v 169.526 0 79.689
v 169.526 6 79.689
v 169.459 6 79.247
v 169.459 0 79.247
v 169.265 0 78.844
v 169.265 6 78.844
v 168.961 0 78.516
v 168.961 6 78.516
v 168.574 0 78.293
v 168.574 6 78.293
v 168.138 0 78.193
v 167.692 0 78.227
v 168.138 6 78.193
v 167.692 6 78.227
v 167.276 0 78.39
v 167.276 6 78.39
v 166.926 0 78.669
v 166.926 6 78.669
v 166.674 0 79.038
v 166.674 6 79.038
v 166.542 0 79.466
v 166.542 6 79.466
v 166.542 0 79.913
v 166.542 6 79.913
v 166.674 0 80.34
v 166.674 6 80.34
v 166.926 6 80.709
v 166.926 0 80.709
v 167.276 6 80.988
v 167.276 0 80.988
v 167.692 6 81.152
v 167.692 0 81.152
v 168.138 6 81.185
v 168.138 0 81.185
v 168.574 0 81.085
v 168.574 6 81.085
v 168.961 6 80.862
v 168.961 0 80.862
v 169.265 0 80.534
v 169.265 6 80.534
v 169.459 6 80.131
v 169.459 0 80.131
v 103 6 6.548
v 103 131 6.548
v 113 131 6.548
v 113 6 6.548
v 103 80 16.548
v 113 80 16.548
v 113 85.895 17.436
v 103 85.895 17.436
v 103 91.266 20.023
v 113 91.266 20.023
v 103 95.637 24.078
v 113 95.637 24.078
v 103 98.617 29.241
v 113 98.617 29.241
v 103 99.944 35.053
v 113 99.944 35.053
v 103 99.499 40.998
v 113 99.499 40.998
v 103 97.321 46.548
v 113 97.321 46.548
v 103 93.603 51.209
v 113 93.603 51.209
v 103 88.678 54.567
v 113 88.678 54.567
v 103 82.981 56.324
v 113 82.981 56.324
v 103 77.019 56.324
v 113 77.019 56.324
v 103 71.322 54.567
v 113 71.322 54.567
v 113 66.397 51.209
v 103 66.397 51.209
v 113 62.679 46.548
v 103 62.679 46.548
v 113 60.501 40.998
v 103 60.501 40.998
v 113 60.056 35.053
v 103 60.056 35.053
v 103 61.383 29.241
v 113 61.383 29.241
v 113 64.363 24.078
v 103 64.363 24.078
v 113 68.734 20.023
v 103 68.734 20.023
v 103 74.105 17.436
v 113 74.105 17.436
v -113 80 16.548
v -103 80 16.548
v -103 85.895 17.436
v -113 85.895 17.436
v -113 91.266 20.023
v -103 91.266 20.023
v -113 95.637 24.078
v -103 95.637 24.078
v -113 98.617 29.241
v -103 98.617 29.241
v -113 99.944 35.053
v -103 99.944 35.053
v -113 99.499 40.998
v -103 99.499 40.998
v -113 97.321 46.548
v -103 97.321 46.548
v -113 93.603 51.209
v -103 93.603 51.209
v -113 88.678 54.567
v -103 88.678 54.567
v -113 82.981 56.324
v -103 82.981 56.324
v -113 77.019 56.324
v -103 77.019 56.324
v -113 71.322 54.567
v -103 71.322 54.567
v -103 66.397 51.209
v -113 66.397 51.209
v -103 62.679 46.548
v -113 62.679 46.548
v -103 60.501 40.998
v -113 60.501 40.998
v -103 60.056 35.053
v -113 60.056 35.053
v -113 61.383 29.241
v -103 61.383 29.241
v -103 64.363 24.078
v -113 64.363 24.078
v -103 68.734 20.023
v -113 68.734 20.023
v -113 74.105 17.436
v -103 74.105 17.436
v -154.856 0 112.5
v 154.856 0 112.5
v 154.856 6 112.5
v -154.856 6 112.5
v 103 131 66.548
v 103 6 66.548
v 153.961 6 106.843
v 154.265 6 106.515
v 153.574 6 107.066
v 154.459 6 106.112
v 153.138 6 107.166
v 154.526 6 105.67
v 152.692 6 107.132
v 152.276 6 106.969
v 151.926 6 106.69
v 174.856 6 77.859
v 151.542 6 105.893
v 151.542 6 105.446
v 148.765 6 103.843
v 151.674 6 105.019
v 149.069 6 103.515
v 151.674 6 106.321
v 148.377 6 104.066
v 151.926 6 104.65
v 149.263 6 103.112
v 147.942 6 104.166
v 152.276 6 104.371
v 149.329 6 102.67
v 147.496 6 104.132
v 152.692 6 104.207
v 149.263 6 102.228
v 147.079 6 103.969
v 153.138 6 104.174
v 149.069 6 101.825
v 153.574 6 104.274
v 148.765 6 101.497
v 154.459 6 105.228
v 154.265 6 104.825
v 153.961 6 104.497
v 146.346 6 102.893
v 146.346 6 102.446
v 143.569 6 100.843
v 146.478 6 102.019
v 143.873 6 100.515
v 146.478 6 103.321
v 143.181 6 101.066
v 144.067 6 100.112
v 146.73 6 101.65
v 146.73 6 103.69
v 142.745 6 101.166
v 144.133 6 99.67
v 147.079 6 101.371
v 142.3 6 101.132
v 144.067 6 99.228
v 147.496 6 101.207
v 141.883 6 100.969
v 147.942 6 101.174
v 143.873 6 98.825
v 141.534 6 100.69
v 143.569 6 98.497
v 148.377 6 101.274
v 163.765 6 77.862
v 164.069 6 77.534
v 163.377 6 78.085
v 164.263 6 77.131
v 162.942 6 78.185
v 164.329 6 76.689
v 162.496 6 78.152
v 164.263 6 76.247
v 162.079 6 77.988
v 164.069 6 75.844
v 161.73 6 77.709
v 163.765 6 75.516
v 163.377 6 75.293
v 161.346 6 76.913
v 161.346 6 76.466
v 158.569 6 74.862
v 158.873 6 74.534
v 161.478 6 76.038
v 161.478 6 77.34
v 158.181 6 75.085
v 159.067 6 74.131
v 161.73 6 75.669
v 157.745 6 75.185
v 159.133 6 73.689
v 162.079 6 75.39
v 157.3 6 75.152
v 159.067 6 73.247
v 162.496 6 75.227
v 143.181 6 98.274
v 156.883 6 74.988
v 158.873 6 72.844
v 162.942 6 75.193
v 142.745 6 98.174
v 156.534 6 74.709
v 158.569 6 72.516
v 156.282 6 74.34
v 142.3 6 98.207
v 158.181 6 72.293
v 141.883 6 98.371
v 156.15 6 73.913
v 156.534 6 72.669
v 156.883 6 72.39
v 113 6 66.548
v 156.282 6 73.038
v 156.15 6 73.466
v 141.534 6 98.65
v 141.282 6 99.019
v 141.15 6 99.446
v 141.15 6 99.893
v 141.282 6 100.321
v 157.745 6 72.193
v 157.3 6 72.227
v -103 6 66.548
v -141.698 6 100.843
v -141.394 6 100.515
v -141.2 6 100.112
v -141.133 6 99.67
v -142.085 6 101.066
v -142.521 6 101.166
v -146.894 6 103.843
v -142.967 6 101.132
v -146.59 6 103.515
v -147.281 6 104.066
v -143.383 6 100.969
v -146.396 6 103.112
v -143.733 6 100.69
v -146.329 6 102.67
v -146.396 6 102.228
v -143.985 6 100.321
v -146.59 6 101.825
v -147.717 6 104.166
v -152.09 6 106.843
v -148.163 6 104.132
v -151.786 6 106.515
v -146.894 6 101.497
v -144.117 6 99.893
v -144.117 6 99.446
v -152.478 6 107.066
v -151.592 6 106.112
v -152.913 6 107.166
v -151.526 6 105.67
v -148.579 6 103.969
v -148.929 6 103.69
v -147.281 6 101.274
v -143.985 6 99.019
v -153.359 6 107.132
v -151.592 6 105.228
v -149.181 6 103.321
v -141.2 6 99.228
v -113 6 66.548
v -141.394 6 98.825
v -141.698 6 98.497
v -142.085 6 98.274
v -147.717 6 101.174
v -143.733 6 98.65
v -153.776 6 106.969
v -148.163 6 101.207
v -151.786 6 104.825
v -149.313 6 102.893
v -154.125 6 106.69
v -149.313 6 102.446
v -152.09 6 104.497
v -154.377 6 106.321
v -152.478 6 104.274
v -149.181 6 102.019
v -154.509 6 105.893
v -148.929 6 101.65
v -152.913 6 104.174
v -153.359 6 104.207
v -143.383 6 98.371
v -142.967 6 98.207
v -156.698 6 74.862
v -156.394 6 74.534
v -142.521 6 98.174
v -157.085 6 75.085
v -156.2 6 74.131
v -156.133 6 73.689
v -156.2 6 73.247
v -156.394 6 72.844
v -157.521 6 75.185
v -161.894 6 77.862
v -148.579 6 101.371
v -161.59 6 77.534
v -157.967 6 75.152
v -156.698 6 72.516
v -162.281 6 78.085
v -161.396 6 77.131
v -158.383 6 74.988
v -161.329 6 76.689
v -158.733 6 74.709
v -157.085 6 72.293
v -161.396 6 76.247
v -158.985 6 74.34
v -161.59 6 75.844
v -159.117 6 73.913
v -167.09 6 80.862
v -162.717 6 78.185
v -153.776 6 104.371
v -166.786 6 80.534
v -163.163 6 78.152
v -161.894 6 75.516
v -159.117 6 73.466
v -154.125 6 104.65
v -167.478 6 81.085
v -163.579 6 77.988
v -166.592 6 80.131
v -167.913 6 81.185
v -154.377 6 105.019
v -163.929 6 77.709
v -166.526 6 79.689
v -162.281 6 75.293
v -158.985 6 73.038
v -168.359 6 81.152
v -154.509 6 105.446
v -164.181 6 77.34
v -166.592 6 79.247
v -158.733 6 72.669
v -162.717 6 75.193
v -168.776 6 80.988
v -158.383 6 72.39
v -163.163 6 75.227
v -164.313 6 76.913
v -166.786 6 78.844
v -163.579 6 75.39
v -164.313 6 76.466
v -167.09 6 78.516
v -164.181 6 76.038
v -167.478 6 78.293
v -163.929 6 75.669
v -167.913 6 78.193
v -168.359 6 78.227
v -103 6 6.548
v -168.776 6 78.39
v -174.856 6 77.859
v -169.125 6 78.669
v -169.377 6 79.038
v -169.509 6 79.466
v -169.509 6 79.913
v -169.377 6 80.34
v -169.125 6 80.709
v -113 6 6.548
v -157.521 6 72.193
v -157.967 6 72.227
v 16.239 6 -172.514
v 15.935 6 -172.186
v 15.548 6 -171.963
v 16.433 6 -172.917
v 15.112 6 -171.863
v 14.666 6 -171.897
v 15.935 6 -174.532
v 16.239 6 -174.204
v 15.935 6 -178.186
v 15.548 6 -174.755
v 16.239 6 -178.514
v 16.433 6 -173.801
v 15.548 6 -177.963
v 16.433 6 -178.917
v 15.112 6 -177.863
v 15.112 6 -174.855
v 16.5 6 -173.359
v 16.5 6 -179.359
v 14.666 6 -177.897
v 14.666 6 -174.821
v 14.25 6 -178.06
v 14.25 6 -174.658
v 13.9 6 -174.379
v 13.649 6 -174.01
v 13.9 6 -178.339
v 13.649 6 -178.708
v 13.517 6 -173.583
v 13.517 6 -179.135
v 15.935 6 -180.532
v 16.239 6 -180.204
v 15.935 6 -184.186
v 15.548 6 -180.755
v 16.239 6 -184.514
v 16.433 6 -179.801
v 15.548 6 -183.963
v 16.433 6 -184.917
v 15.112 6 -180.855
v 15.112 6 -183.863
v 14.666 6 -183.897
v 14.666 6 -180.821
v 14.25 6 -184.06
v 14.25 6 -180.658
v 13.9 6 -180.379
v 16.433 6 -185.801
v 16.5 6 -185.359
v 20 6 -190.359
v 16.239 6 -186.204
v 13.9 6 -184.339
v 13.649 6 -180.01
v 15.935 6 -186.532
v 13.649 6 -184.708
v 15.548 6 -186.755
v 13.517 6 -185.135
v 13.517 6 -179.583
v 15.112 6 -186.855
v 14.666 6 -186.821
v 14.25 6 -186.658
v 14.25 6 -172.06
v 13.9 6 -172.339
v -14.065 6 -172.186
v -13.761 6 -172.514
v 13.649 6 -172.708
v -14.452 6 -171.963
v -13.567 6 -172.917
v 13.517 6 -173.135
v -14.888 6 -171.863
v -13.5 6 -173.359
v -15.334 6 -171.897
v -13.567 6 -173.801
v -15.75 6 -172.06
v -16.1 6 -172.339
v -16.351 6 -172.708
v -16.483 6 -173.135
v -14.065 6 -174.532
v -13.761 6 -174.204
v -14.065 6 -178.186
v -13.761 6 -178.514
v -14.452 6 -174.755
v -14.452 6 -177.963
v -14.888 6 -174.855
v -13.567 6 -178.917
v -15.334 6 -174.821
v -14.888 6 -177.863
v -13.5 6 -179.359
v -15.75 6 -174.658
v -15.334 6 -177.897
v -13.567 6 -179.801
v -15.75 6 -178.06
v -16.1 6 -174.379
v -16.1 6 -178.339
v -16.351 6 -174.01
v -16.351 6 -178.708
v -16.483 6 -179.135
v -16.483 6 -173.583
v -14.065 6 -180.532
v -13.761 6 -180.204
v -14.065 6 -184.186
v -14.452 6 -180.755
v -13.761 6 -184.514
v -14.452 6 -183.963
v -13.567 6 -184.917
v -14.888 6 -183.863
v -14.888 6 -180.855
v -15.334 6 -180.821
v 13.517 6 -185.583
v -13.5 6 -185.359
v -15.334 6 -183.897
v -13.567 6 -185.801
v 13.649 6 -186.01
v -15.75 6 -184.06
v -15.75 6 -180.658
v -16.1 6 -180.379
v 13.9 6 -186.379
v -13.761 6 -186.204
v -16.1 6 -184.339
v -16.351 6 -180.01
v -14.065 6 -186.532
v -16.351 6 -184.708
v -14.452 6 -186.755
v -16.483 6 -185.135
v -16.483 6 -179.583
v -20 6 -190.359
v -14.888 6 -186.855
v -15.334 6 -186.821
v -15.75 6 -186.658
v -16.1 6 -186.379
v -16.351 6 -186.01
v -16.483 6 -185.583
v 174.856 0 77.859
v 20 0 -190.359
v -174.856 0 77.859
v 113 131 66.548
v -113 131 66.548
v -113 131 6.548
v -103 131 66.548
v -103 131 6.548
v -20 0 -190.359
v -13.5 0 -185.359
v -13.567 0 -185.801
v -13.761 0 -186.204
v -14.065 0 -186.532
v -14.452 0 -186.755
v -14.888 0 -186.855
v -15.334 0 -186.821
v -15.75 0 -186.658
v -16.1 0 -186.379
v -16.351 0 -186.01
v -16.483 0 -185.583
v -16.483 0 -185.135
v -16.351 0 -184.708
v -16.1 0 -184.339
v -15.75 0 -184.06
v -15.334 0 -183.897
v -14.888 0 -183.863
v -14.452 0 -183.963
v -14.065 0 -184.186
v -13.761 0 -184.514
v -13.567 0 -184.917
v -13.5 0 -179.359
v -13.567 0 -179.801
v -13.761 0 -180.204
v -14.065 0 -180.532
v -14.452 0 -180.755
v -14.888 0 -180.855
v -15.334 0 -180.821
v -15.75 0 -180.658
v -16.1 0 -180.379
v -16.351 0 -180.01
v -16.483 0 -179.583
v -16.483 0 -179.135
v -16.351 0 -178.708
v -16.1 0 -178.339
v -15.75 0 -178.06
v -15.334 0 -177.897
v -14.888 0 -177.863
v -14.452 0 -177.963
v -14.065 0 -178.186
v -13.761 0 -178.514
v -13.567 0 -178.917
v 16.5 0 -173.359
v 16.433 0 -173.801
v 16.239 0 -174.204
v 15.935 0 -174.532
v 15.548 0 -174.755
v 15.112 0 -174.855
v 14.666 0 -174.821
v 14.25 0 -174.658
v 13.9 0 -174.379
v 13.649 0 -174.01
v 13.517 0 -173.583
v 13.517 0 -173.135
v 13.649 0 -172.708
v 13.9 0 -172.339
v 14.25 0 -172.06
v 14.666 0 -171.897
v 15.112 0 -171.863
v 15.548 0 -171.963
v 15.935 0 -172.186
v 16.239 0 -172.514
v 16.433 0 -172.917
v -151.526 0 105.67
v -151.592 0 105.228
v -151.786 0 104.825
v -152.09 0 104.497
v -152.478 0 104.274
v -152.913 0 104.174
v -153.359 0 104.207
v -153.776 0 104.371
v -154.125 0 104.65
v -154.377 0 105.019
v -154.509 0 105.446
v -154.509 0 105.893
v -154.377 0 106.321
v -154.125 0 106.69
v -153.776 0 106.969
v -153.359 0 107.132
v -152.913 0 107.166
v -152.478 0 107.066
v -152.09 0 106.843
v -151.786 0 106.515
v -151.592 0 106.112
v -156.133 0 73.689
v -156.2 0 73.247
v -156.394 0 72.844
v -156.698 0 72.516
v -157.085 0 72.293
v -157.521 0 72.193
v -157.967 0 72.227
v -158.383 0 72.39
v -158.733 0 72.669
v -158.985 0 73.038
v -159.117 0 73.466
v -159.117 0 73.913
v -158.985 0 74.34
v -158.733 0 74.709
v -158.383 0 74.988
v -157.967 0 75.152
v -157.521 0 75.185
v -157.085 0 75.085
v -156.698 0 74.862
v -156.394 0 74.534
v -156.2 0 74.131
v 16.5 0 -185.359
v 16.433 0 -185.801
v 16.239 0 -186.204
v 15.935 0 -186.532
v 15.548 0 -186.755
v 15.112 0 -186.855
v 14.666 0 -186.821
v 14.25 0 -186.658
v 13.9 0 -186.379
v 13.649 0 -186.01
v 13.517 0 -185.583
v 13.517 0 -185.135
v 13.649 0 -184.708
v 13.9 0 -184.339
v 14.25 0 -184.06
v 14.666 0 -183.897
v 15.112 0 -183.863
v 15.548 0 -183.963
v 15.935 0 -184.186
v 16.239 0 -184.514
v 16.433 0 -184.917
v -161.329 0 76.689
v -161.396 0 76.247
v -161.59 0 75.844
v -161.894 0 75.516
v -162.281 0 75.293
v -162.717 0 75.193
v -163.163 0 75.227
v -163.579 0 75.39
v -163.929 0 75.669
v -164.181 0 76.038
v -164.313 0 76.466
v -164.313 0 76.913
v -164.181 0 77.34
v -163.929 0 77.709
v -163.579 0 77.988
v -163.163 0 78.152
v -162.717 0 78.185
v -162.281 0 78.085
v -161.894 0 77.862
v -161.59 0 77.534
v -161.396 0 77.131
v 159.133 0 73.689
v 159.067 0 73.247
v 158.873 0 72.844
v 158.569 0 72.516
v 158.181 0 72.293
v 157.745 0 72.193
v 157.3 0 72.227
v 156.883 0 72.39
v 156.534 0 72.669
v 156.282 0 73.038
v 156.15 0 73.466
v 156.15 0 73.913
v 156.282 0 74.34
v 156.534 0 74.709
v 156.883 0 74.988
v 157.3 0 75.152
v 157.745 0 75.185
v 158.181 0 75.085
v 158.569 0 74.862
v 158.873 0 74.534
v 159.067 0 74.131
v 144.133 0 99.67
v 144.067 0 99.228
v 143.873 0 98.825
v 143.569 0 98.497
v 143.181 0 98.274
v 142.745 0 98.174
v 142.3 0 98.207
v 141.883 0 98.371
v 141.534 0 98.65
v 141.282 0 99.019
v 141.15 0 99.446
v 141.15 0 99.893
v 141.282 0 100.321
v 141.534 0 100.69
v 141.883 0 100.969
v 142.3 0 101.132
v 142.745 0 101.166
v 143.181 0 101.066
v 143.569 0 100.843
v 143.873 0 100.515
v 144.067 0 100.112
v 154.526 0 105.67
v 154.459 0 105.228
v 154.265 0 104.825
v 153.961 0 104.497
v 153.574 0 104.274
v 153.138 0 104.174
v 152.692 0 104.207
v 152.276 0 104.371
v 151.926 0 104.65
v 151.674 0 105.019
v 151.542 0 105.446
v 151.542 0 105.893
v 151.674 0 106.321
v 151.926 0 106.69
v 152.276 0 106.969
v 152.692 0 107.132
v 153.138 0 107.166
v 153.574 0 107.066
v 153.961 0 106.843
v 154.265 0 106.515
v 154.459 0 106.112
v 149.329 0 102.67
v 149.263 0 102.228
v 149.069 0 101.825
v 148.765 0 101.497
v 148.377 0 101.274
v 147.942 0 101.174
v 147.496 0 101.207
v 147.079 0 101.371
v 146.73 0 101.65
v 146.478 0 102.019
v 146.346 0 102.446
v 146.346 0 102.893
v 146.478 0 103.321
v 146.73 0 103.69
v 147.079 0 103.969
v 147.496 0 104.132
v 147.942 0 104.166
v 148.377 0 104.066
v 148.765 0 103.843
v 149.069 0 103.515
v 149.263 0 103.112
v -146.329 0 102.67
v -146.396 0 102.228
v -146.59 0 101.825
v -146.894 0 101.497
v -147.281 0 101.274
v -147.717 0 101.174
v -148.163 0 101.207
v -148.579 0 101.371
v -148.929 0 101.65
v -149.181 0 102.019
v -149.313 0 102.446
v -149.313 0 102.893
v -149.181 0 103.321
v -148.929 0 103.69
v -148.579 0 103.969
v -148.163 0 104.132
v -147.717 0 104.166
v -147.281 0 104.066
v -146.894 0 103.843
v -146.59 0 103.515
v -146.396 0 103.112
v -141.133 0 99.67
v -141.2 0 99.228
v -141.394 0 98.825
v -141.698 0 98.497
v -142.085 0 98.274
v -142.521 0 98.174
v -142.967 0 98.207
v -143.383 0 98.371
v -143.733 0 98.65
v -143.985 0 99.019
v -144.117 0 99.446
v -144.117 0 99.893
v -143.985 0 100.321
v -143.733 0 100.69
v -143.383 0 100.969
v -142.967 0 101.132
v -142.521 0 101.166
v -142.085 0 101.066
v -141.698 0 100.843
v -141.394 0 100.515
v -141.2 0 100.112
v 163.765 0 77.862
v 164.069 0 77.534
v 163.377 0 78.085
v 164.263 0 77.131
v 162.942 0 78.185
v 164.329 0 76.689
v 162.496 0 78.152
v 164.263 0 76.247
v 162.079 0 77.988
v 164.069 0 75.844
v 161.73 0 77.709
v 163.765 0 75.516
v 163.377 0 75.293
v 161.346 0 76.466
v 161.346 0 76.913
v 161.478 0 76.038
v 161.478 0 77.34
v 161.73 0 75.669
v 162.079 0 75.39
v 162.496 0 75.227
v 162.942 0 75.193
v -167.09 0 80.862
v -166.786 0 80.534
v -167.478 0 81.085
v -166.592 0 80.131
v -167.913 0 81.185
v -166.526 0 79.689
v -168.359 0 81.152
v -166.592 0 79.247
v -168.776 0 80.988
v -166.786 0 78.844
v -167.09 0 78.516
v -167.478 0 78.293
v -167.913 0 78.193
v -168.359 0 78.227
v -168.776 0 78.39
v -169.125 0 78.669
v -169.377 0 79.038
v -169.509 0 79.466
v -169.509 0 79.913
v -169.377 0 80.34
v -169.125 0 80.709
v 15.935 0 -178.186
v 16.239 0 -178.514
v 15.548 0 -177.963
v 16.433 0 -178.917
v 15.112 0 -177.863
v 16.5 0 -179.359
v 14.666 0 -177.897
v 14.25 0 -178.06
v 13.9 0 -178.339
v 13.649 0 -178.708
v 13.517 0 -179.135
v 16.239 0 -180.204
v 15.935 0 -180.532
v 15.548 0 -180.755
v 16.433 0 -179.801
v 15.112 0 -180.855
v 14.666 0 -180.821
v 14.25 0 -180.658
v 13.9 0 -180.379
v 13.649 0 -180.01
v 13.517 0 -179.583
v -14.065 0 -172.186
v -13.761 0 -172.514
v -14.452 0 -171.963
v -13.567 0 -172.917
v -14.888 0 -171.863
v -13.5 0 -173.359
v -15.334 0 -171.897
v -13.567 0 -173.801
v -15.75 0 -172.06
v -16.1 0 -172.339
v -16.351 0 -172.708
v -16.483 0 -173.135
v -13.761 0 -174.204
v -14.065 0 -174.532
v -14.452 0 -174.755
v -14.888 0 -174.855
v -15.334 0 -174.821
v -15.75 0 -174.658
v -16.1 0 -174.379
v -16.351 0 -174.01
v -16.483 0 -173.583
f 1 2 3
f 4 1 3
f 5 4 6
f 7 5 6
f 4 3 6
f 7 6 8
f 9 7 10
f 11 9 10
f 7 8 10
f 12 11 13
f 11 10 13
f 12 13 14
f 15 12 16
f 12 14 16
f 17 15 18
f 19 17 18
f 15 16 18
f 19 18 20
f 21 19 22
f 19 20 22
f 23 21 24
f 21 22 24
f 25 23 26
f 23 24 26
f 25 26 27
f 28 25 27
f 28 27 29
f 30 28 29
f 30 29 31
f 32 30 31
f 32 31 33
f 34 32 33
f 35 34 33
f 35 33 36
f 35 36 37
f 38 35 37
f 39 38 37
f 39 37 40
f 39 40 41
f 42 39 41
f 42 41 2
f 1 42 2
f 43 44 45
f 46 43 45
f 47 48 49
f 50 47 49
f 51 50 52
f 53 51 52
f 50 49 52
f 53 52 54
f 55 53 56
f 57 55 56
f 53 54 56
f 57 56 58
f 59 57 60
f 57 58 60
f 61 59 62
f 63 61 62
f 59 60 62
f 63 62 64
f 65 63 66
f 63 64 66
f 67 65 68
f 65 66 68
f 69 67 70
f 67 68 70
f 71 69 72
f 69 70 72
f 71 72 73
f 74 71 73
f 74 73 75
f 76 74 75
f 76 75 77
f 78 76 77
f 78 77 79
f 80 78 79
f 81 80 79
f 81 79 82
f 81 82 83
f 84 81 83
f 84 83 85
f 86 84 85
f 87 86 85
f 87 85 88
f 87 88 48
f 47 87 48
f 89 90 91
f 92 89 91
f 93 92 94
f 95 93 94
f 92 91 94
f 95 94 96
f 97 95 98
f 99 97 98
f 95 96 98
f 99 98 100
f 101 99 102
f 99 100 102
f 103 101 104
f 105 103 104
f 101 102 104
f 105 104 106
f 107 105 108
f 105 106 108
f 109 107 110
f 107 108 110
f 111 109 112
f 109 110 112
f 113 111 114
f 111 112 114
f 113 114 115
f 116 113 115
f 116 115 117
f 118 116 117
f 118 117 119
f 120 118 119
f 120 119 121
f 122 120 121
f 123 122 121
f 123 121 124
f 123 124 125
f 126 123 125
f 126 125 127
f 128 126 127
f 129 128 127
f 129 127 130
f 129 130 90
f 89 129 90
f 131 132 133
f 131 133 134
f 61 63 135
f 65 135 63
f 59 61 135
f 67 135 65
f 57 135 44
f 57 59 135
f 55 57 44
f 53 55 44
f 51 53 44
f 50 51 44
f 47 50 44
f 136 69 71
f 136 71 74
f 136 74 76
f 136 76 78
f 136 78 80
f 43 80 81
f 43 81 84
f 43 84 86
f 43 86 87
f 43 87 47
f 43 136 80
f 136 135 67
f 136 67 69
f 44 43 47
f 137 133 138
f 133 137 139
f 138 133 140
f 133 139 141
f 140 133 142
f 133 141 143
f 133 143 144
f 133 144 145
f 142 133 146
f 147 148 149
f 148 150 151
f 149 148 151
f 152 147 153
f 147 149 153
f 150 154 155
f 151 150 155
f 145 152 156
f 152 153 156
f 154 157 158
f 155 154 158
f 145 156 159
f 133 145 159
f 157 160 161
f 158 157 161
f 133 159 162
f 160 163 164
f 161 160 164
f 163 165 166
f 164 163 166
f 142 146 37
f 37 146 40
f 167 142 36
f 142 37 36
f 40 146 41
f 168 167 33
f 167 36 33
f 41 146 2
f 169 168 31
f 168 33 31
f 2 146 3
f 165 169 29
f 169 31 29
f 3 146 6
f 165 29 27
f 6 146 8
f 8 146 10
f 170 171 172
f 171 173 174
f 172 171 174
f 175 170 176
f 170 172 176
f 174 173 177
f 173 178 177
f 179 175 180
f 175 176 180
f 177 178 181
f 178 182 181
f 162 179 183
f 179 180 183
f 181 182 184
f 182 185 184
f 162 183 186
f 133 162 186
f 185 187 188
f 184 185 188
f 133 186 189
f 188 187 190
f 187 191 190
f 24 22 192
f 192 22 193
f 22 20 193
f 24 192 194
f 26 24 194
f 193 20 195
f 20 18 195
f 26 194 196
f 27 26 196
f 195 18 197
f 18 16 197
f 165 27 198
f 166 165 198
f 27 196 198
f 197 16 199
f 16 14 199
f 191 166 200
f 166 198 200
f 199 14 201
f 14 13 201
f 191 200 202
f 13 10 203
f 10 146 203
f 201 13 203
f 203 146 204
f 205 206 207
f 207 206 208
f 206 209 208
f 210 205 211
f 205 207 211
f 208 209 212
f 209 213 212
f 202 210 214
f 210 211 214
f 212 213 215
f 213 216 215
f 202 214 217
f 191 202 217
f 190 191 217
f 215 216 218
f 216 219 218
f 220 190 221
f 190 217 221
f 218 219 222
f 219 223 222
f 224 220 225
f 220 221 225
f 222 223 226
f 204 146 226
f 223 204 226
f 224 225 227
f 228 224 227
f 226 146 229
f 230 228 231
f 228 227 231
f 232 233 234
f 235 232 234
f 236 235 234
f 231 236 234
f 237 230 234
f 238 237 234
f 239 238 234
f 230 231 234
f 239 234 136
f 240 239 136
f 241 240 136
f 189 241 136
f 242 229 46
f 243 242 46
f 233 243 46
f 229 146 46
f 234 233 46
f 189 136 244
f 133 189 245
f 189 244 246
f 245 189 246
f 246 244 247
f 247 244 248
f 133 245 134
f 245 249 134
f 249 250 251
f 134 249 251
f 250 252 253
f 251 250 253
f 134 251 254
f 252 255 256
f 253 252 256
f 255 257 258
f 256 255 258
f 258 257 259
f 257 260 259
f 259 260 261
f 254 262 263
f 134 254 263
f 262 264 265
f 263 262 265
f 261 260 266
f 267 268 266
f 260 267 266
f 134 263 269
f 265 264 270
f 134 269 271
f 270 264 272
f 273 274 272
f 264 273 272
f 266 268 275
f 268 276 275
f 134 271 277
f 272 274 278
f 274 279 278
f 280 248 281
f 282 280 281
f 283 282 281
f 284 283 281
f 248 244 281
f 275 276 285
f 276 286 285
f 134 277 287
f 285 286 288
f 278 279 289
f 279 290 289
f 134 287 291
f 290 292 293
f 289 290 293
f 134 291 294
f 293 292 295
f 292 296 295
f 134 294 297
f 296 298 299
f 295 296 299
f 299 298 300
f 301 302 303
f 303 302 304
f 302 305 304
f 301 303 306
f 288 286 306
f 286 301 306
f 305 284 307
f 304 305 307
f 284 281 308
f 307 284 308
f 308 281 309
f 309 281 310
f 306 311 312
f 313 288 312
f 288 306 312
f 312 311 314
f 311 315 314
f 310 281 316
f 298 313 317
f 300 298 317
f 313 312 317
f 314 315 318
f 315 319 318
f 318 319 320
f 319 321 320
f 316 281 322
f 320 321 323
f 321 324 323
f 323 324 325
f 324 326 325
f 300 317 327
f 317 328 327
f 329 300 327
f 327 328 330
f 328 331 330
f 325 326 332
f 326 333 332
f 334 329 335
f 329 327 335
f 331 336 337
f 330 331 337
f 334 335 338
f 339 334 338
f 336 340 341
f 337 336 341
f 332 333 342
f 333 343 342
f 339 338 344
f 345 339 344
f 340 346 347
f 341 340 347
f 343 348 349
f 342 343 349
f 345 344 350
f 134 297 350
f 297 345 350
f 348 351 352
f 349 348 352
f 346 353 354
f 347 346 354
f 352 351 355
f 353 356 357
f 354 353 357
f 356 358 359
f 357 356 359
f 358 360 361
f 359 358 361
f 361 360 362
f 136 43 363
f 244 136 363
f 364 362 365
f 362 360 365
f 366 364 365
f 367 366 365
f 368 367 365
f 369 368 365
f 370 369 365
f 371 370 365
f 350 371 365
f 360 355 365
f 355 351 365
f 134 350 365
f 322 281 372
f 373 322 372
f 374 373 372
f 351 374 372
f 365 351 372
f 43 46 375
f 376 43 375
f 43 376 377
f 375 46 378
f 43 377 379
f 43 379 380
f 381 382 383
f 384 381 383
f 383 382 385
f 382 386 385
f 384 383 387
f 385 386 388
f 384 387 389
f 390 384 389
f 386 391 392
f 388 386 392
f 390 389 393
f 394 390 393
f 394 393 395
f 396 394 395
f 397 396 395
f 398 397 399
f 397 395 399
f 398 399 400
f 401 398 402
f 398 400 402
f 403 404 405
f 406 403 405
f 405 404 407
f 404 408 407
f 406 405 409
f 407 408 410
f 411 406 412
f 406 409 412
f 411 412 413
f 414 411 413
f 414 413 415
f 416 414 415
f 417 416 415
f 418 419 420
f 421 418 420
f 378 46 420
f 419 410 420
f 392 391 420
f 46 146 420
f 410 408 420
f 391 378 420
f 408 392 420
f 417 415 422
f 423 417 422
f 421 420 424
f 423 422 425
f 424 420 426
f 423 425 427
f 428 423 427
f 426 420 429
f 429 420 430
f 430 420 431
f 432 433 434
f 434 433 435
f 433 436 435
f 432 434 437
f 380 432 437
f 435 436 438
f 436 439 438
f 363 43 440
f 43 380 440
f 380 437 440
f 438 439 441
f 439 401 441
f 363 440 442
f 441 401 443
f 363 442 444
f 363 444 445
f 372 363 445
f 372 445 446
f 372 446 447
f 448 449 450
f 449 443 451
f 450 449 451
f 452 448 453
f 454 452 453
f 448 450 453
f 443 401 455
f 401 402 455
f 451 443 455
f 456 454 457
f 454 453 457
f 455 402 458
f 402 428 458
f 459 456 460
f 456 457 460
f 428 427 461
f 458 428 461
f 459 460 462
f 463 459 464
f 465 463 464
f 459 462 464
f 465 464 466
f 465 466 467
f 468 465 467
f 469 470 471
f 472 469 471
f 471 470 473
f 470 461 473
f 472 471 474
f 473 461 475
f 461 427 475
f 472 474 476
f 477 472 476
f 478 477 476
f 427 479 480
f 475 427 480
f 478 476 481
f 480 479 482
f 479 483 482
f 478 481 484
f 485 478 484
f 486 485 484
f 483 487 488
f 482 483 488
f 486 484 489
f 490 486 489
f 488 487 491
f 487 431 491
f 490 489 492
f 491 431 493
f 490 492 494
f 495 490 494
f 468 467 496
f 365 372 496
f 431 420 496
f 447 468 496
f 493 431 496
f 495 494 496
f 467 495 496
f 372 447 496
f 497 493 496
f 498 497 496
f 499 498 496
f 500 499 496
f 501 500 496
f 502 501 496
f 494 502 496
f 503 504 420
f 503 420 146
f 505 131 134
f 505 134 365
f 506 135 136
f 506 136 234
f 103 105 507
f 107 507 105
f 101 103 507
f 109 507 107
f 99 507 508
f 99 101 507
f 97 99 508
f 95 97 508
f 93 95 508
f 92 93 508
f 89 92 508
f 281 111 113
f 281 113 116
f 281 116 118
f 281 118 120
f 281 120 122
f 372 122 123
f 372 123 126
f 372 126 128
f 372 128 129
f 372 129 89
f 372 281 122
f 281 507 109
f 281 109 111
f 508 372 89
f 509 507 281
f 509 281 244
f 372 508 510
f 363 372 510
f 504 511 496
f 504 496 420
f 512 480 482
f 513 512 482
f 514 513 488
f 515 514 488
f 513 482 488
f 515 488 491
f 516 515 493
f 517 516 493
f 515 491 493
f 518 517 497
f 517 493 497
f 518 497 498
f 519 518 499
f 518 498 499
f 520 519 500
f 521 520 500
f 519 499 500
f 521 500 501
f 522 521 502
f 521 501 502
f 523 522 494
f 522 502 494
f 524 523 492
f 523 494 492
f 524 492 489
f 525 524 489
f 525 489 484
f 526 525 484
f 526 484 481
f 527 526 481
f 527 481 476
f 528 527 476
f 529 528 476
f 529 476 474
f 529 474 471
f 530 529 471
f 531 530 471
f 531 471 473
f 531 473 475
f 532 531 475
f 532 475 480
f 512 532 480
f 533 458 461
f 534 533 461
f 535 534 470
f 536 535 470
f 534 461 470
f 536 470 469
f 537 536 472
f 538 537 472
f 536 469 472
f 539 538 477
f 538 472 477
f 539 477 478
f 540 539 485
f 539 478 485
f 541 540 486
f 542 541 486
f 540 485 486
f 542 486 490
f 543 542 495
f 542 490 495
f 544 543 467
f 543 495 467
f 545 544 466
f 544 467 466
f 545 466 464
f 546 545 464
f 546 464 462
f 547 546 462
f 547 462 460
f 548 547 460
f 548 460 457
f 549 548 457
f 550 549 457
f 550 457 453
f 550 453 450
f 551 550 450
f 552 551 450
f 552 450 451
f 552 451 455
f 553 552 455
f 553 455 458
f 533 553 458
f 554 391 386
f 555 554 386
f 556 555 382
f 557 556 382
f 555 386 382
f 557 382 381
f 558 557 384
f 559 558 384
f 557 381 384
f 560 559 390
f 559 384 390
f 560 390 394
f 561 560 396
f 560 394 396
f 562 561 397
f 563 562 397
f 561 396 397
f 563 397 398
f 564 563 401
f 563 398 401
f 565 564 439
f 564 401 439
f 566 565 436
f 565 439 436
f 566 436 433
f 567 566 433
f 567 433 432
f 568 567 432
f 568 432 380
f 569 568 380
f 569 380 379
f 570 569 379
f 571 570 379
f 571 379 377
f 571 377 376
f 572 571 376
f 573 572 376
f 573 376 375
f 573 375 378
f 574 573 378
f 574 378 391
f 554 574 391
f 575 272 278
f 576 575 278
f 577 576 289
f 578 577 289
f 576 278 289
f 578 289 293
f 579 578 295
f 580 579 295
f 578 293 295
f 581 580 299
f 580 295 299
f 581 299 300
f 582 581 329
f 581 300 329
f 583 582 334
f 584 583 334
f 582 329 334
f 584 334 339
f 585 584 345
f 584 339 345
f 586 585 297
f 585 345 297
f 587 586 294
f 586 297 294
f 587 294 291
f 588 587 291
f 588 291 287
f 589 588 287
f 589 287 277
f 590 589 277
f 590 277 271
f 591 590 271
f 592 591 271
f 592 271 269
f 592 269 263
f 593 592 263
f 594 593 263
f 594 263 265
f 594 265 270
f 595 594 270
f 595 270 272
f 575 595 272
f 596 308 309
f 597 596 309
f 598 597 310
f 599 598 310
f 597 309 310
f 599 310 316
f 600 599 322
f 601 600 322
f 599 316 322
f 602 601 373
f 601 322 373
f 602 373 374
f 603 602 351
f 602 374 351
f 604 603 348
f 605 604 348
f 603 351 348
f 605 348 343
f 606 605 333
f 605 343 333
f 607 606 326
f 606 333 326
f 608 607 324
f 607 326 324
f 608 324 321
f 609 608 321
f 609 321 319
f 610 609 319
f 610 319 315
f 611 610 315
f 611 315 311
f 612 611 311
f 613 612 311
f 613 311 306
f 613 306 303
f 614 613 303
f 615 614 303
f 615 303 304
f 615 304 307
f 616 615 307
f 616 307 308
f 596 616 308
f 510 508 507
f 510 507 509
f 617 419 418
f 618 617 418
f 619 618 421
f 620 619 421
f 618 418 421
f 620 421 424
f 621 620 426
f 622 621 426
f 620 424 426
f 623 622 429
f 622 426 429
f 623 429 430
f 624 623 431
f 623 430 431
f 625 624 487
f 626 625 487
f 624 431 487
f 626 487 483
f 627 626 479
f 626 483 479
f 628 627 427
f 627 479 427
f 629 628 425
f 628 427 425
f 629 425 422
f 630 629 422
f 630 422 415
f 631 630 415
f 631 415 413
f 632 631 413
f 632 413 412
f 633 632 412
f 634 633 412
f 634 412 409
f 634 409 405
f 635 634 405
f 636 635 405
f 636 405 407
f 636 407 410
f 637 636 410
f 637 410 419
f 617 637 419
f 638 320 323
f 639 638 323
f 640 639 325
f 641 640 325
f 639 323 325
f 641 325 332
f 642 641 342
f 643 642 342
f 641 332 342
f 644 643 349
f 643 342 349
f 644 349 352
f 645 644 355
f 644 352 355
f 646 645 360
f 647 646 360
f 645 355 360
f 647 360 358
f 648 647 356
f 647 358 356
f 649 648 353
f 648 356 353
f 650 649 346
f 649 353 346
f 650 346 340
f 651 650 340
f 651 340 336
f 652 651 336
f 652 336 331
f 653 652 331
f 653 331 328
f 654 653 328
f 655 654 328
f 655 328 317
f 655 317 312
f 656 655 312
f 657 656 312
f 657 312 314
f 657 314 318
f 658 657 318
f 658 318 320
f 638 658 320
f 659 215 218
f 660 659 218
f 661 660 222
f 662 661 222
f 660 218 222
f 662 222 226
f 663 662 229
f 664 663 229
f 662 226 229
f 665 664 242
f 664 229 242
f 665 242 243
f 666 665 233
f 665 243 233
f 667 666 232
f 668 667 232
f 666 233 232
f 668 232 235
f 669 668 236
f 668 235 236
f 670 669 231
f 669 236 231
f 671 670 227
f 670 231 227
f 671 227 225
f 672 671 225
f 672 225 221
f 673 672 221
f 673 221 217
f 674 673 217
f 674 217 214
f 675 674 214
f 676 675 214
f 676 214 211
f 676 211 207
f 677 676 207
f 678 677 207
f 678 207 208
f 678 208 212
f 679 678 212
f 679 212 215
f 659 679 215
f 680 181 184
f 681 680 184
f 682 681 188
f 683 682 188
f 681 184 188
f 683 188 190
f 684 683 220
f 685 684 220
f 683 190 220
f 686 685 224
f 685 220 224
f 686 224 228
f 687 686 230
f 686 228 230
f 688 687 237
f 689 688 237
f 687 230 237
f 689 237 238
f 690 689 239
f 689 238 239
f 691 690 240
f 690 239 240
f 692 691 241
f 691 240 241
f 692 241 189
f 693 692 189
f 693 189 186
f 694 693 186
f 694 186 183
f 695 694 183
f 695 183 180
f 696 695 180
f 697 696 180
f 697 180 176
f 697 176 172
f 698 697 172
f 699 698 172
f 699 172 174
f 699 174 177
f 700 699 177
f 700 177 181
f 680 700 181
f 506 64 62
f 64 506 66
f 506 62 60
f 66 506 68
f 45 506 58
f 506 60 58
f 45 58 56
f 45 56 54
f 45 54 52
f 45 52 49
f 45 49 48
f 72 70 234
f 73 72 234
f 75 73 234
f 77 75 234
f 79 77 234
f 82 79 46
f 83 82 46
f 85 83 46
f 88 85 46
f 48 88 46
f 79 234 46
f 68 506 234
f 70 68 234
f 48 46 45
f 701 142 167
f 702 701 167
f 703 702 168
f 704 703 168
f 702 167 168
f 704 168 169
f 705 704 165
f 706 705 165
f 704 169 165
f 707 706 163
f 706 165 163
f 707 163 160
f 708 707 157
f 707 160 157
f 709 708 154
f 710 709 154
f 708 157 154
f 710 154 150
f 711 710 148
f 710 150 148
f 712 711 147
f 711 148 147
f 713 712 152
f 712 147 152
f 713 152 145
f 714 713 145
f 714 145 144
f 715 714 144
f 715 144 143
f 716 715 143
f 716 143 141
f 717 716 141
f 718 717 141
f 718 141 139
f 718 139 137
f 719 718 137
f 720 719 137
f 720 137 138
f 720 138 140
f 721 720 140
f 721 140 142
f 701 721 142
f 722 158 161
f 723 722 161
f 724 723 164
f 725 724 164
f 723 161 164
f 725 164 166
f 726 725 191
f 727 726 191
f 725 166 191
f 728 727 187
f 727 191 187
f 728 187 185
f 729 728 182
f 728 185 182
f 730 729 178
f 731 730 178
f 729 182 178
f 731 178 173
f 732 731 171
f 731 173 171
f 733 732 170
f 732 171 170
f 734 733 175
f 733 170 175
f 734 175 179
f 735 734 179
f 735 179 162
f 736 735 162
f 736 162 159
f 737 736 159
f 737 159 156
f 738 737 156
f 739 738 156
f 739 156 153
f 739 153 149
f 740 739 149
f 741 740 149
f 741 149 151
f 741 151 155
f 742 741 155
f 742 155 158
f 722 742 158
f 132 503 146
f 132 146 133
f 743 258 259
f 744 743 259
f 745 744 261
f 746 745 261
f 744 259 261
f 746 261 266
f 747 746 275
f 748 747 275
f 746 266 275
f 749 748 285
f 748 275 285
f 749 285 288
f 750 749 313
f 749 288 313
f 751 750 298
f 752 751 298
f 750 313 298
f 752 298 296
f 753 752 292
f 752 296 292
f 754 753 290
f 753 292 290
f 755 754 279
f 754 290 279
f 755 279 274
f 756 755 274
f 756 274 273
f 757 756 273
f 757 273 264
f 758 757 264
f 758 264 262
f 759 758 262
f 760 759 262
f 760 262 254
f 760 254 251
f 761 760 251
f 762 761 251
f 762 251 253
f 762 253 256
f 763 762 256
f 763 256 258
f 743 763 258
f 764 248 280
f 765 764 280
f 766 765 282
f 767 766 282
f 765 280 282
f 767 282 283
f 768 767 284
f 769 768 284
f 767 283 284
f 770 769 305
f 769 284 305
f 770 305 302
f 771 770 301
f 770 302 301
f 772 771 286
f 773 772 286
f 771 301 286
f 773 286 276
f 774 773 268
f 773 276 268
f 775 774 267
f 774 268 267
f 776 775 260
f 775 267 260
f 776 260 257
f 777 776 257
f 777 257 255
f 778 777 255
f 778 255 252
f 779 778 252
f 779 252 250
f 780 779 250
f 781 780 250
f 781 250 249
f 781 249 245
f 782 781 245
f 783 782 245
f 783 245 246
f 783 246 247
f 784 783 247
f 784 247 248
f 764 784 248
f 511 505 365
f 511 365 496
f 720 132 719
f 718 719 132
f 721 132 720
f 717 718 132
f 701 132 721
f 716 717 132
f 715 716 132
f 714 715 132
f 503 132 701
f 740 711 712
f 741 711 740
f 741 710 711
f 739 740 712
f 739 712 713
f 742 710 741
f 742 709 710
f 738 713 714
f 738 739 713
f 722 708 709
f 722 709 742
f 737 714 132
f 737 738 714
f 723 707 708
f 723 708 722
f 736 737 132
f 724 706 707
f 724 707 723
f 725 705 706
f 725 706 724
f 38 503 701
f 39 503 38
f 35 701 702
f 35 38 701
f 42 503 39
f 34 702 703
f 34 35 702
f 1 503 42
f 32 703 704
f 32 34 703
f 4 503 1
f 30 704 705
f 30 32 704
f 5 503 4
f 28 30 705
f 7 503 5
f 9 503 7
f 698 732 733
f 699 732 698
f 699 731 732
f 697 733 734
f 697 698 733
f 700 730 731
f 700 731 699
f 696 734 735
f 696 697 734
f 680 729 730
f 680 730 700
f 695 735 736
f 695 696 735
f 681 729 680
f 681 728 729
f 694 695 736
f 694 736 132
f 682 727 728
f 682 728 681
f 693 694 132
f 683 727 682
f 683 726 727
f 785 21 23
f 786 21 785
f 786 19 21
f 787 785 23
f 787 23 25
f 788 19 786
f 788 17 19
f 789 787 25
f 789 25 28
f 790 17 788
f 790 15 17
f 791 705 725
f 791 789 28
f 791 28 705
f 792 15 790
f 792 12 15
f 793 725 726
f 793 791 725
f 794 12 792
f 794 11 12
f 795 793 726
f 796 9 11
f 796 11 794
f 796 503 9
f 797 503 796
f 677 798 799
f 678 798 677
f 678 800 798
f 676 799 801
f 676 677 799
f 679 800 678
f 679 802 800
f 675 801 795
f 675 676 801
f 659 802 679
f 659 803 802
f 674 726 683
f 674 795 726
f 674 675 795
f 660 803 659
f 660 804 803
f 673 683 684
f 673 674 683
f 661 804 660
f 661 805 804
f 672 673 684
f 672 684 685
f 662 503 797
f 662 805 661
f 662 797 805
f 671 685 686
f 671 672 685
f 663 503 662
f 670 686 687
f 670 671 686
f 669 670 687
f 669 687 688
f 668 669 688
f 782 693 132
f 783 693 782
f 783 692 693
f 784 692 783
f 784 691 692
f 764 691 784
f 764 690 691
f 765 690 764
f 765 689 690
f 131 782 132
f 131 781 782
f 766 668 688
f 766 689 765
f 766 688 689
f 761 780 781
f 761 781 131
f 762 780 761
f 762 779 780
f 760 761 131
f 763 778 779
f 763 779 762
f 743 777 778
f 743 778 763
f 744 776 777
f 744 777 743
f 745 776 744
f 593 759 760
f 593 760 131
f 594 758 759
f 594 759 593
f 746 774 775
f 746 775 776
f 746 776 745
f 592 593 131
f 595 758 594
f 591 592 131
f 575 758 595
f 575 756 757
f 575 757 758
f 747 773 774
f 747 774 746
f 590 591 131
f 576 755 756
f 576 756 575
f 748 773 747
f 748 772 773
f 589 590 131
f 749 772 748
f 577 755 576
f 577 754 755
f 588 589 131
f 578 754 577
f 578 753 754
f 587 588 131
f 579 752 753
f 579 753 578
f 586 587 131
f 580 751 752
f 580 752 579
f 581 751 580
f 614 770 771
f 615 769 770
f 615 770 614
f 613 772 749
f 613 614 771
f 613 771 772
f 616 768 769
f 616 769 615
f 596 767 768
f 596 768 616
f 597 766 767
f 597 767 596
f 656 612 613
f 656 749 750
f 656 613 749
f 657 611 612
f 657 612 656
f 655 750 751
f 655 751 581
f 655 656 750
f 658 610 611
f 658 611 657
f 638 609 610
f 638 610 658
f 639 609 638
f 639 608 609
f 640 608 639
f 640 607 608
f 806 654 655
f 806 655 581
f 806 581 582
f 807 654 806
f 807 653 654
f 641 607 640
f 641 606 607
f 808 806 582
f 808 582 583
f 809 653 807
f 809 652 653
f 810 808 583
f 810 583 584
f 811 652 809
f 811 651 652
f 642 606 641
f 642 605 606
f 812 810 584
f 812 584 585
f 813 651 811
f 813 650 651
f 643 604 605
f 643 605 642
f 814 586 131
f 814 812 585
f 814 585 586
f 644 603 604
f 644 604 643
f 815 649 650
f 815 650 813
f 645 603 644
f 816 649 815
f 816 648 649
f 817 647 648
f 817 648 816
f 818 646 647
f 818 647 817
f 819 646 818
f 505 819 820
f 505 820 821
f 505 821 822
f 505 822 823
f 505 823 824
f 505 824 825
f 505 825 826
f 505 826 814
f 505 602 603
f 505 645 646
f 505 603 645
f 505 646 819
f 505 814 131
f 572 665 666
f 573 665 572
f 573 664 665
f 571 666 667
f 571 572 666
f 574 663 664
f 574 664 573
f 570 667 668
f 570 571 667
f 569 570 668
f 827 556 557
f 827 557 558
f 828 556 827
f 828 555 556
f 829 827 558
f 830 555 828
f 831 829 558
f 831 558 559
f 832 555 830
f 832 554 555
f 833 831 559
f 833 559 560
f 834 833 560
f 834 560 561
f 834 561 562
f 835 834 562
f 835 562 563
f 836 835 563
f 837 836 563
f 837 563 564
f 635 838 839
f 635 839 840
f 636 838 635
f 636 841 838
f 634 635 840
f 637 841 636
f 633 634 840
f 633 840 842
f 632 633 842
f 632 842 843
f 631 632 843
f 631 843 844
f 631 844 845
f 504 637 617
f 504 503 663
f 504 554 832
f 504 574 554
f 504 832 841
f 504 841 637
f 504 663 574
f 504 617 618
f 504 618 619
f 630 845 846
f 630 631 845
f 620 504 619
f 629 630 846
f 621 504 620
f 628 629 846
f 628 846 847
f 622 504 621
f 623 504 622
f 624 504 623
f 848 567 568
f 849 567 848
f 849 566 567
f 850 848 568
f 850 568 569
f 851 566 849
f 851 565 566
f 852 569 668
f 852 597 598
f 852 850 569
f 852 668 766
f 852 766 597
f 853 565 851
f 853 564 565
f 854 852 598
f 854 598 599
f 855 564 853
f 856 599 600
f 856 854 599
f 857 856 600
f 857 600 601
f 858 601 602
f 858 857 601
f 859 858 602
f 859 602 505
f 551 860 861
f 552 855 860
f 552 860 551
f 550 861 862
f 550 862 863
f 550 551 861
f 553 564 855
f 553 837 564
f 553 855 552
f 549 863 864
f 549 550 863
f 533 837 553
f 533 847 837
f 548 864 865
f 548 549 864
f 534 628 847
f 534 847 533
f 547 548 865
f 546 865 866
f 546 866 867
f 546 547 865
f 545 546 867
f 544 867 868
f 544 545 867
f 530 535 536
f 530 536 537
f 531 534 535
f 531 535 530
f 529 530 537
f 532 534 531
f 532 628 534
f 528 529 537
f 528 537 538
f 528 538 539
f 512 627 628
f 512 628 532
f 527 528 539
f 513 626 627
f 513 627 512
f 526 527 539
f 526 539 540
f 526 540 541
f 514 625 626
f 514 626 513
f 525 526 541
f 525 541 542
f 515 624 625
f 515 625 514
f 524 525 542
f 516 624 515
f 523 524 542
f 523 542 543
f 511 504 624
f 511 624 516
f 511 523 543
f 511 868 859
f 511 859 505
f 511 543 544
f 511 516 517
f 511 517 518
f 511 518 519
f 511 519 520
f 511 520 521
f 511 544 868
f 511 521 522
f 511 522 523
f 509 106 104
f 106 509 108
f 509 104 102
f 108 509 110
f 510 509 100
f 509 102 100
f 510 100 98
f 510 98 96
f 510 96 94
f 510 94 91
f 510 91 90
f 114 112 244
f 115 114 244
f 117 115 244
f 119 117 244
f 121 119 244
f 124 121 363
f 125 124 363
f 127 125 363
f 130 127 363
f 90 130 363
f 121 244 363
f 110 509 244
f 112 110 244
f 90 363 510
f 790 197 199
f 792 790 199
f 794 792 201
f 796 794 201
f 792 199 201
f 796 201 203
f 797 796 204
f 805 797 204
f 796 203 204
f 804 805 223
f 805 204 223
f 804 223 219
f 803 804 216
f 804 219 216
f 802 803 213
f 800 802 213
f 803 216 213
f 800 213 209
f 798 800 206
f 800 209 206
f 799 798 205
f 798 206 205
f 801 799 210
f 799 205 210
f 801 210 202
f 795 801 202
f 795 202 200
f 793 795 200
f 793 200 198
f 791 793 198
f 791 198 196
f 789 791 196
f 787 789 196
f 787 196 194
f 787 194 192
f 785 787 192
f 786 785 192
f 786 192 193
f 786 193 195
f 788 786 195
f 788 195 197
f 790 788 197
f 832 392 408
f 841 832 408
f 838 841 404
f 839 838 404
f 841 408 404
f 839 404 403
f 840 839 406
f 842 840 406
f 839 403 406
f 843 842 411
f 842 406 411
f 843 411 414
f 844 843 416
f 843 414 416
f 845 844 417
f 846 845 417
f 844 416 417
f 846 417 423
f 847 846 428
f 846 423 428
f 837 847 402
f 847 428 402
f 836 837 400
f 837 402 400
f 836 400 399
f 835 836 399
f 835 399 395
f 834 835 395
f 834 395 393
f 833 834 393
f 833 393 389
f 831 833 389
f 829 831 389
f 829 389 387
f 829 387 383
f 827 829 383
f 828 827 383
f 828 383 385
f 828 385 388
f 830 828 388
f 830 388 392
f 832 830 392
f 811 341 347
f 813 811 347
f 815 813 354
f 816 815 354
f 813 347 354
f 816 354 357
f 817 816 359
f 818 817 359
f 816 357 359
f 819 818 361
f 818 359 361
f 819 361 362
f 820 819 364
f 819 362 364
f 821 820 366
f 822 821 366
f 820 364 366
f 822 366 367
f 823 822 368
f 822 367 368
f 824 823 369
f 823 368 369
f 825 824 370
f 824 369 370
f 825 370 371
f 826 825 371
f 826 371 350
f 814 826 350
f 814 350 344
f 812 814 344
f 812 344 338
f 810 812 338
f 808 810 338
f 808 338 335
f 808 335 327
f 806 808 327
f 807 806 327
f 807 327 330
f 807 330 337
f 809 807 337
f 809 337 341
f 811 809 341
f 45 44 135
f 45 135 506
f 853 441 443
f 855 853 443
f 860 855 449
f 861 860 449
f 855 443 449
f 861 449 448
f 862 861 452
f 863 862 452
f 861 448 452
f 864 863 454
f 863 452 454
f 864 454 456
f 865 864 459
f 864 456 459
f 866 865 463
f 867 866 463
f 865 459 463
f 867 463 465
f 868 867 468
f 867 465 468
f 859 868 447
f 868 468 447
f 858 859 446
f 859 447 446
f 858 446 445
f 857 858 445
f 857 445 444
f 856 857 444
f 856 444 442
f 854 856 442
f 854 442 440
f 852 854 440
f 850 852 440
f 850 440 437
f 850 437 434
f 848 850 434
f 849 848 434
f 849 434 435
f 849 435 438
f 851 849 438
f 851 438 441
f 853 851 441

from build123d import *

# Parameters (mm, degrees)
BOSS_EXTRUDE2_DEPTH = 6
SKETCH9_R           = 1.5
CUT_EXTRUDE1_DEPTH  = 7
SKETCH10_W          = 10
SKETCH10_H          = 60
BOSS_EXTRUDE3_DEPTH = 125
SKETCH11_R          = 20
CUT_EXTRUDE2_DEPTH  = 288.855715857


with BuildPart() as part:
    # Sketch8 → Boss-Extrude2 (new body)
    with BuildSketch(Plane(origin=(0, 0, 0), x_dir=(1, 0, 0), z_dir=(0, 1, 0))):
        Polygon((-20, 190.358983854), (20, 190.358983854), (174.855715857, -77.858983852), (154.855715857, -112.500000003), (-154.855715857, -112.500000003), (-174.855715857, -77.858983852), align=None)
    extrude(amount=BOSS_EXTRUDE2_DEPTH)

    # Sketch9 → Cut-Extrude1 (cut, through all)
    with BuildSketch(Plane(origin=(0, 6, 0), x_dir=(1, 0, 0), z_dir=(0, 1, 0))):
        with Locations((15, 185.358983854)):
            Circle(SKETCH9_R)
        with Locations((-15, 185.358983854)):
            Circle(SKETCH9_R)
        with Locations((-15, 179.358983854)):
            Circle(SKETCH9_R)
        with Locations((-15, 173.358983854)):
            Circle(SKETCH9_R)
        with Locations((15, 179.358983854)):
            Circle(SKETCH9_R)
        with Locations((15, 173.358983854)):
            Circle(SKETCH9_R)
        with Locations((153.025588838, -105.669872984)):
            Circle(SKETCH9_R)
        with Locations((168.025588838, -79.68911087)):
            Circle(SKETCH9_R)
        with Locations((162.829436415, -76.68911087)):
            Circle(SKETCH9_R)
        with Locations((157.633283992, -73.68911087)):
            Circle(SKETCH9_R)
        with Locations((147.829436415, -102.669872984)):
            Circle(SKETCH9_R)
        with Locations((142.633283992, -99.669872984)):
            Circle(SKETCH9_R)
        with Locations((-168.025588838, -79.68911087)):
            Circle(SKETCH9_R)
        with Locations((-153.025588838, -105.669872984)):
            Circle(SKETCH9_R)
        with Locations((-147.829436415, -102.669872984)):
            Circle(SKETCH9_R)
        with Locations((-142.633283992, -99.669872984)):
            Circle(SKETCH9_R)
        with Locations((-162.829436415, -76.68911087)):
            Circle(SKETCH9_R)
        with Locations((-157.633283992, -73.68911087)):
            Circle(SKETCH9_R)
    extrude(amount=-CUT_EXTRUDE1_DEPTH, mode=Mode.SUBTRACT)

    # Sketch10 → Boss-Extrude3 (add)
    with BuildSketch(Plane(origin=(0, 6, 0), x_dir=(1, 0, 0), z_dir=(0, 1, 0))):
        with Locations((-108, -36.54767864)):
            Rectangle(SKETCH10_W, SKETCH10_H)
        with Locations((108, -36.54767864)):
            Rectangle(SKETCH10_W, SKETCH10_H)
    extrude(amount=BOSS_EXTRUDE3_DEPTH)

    # Sketch11 → Cut-Extrude2 (cut, through all)
    with BuildSketch(Plane(origin=(113, 0, 0), x_dir=(0, 0, -1), z_dir=(1, 0, 0))):
        with Locations((-36.54767864, 80)):
            Circle(SKETCH11_R)
    extrude(amount=-CUT_EXTRUDE2_DEPTH, mode=Mode.SUBTRACT)


solid = part.part
